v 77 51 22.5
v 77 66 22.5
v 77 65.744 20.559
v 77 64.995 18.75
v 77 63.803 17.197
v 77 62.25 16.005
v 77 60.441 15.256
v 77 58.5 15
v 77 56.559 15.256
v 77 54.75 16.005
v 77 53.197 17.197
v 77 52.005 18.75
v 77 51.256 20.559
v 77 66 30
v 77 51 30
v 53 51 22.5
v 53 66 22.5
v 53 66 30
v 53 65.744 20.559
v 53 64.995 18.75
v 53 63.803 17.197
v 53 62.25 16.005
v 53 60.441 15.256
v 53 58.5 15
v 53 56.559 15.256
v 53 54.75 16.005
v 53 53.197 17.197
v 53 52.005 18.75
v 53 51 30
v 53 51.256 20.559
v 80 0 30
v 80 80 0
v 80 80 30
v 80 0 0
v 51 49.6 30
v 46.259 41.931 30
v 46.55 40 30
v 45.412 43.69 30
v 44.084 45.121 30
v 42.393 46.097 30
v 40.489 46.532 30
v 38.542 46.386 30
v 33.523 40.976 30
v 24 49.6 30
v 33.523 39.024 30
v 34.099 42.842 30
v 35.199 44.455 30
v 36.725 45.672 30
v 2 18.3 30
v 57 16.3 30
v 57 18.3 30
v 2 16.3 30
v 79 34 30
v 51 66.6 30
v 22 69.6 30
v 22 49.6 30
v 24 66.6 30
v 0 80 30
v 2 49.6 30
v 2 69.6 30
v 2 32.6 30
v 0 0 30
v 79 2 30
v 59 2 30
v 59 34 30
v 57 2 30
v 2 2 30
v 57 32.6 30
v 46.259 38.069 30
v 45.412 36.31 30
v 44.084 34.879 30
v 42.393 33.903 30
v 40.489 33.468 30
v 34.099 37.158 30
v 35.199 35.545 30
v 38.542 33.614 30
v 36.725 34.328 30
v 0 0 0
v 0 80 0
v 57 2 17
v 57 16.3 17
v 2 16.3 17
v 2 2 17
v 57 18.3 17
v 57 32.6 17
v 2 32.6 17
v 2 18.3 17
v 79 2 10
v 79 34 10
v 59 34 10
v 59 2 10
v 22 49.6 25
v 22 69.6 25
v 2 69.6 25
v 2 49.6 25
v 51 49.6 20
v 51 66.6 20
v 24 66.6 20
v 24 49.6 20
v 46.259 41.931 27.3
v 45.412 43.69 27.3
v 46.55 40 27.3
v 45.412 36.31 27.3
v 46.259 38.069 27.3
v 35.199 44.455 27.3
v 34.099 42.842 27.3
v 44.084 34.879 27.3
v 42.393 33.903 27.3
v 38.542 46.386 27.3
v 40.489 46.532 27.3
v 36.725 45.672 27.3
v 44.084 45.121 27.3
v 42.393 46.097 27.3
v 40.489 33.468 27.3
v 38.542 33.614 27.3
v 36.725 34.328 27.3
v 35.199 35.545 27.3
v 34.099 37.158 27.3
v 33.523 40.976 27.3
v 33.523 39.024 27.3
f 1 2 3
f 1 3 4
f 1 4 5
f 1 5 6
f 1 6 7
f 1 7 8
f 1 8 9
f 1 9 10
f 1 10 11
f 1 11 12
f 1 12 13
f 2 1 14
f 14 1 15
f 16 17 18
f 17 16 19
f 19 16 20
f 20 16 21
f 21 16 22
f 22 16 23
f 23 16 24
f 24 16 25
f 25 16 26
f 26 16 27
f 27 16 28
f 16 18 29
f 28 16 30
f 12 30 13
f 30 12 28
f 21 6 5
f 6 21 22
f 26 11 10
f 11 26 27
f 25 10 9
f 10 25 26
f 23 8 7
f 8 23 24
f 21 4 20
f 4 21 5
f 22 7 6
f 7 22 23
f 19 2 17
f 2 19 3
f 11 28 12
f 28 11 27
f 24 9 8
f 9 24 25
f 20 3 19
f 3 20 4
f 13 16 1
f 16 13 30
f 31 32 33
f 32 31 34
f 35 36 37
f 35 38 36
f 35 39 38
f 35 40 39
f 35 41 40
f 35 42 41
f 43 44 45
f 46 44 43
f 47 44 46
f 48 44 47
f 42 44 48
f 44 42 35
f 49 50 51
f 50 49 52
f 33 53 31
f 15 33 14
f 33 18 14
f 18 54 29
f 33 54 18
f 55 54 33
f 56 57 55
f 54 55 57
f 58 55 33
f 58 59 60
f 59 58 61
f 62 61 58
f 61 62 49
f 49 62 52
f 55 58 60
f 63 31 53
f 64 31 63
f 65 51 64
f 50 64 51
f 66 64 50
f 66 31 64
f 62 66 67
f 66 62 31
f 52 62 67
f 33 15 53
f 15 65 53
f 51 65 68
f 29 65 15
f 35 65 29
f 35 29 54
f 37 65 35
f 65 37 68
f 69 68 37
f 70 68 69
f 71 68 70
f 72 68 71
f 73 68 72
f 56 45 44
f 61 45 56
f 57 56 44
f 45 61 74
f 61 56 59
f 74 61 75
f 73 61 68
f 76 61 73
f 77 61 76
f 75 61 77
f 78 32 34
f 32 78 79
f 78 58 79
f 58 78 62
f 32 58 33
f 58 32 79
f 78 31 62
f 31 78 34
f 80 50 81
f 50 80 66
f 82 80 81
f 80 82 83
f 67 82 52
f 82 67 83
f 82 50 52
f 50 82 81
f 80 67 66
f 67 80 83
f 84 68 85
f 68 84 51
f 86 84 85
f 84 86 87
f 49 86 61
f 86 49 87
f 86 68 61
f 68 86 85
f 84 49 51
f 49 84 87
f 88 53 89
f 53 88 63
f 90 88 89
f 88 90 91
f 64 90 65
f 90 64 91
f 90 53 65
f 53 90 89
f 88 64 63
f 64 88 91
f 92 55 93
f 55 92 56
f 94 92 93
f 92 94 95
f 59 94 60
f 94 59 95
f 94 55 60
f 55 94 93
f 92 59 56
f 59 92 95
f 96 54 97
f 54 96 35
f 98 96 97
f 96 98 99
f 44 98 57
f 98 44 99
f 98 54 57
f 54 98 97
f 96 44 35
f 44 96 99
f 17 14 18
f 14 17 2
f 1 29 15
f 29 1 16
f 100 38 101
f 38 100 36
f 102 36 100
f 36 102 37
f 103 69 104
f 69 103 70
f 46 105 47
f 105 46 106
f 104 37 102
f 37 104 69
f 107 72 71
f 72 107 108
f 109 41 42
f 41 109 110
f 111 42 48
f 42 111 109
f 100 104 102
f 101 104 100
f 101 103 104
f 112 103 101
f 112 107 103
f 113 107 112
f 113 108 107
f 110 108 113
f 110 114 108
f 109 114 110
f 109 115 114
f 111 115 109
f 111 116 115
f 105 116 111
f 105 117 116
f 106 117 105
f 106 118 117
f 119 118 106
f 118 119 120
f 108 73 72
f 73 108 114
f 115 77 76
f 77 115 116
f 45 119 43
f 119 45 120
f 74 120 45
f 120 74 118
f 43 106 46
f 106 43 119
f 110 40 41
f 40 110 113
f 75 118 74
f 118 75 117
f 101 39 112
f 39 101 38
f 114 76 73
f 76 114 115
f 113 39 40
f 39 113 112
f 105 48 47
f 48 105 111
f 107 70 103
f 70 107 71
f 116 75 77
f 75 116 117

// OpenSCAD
length = 80;
width = 80;
height = 30;
magnetPadding = 15;
magnetBaseInnerDiameter = 13.1;
magnetHeight = 2.7;
difference(){
    cube([length, width, height]);
    
    //workers 1 x 5, 55 long x 14.3 wide x 13 high
    translate([2, 2, height - 13])
        cube([55, 14.3, 13]); 
    
    //workers 1 x 5, 55 long x 14.3 wide x 13 high
    translate([2, 2 + 2 + 14.3, height - 13])
        cube([55, 14.3, 13]); 
    
    //meeples x 3, 32 x 20 x 20 high
    translate([2 + 2 + 55, 2, height - 20])
        cube([20, 32, 20]);
    
    //white tiny cubes x 5 (big open tray) 20x20x5high
    translate([2, 14.3 + 14.3 + 2 + 2 + 2 + magnetPadding, height - 5])
        cube([20, 20, 5]);
    
    //colored normal cubes, 27 x 17 x 10    
    translate([2 + 2 + 20, 14.3 + 14.3 + 2 + 2 + 2 + magnetPadding, height - 10])
        cube([27, 17, 10]);
    
    cylinderDiameter = 15;
    translate([2 + 2 + 2 + 20 + 27, 32 + 2 + 2 + magnetPadding, height - (cylinderDiameter/2)])
        cube([24, cylinderDiameter, cylinderDiameter/2]);

    intersection() {
        translate([2 + 2 + 2 + 20 + 27, 32 + 2 + 2 + magnetPadding, height - (cylinderDiameter)])
            cube([24, cylinderDiameter, cylinderDiameter/2]);
        translate([2 + 2 + 2 + 20 + 27, 32 + 2 + 2 + cylinderDiameter/2 + magnetPadding, height - (cylinderDiameter/2)])
            rotate([0, 90, 0])
                cylinder(24, d=cylinderDiameter);
    }
    translate([length/2, width/2, height - magnetHeight])
        cylinder(magnetHeight, d=magnetBaseInnerDiameter);
//        rotate([0, 90, 0])
//            cylinder(24, d=15);

//    cube() //disks x 5 (and make bottom rounded?) 24 length, 14 diameter, 

}

    
